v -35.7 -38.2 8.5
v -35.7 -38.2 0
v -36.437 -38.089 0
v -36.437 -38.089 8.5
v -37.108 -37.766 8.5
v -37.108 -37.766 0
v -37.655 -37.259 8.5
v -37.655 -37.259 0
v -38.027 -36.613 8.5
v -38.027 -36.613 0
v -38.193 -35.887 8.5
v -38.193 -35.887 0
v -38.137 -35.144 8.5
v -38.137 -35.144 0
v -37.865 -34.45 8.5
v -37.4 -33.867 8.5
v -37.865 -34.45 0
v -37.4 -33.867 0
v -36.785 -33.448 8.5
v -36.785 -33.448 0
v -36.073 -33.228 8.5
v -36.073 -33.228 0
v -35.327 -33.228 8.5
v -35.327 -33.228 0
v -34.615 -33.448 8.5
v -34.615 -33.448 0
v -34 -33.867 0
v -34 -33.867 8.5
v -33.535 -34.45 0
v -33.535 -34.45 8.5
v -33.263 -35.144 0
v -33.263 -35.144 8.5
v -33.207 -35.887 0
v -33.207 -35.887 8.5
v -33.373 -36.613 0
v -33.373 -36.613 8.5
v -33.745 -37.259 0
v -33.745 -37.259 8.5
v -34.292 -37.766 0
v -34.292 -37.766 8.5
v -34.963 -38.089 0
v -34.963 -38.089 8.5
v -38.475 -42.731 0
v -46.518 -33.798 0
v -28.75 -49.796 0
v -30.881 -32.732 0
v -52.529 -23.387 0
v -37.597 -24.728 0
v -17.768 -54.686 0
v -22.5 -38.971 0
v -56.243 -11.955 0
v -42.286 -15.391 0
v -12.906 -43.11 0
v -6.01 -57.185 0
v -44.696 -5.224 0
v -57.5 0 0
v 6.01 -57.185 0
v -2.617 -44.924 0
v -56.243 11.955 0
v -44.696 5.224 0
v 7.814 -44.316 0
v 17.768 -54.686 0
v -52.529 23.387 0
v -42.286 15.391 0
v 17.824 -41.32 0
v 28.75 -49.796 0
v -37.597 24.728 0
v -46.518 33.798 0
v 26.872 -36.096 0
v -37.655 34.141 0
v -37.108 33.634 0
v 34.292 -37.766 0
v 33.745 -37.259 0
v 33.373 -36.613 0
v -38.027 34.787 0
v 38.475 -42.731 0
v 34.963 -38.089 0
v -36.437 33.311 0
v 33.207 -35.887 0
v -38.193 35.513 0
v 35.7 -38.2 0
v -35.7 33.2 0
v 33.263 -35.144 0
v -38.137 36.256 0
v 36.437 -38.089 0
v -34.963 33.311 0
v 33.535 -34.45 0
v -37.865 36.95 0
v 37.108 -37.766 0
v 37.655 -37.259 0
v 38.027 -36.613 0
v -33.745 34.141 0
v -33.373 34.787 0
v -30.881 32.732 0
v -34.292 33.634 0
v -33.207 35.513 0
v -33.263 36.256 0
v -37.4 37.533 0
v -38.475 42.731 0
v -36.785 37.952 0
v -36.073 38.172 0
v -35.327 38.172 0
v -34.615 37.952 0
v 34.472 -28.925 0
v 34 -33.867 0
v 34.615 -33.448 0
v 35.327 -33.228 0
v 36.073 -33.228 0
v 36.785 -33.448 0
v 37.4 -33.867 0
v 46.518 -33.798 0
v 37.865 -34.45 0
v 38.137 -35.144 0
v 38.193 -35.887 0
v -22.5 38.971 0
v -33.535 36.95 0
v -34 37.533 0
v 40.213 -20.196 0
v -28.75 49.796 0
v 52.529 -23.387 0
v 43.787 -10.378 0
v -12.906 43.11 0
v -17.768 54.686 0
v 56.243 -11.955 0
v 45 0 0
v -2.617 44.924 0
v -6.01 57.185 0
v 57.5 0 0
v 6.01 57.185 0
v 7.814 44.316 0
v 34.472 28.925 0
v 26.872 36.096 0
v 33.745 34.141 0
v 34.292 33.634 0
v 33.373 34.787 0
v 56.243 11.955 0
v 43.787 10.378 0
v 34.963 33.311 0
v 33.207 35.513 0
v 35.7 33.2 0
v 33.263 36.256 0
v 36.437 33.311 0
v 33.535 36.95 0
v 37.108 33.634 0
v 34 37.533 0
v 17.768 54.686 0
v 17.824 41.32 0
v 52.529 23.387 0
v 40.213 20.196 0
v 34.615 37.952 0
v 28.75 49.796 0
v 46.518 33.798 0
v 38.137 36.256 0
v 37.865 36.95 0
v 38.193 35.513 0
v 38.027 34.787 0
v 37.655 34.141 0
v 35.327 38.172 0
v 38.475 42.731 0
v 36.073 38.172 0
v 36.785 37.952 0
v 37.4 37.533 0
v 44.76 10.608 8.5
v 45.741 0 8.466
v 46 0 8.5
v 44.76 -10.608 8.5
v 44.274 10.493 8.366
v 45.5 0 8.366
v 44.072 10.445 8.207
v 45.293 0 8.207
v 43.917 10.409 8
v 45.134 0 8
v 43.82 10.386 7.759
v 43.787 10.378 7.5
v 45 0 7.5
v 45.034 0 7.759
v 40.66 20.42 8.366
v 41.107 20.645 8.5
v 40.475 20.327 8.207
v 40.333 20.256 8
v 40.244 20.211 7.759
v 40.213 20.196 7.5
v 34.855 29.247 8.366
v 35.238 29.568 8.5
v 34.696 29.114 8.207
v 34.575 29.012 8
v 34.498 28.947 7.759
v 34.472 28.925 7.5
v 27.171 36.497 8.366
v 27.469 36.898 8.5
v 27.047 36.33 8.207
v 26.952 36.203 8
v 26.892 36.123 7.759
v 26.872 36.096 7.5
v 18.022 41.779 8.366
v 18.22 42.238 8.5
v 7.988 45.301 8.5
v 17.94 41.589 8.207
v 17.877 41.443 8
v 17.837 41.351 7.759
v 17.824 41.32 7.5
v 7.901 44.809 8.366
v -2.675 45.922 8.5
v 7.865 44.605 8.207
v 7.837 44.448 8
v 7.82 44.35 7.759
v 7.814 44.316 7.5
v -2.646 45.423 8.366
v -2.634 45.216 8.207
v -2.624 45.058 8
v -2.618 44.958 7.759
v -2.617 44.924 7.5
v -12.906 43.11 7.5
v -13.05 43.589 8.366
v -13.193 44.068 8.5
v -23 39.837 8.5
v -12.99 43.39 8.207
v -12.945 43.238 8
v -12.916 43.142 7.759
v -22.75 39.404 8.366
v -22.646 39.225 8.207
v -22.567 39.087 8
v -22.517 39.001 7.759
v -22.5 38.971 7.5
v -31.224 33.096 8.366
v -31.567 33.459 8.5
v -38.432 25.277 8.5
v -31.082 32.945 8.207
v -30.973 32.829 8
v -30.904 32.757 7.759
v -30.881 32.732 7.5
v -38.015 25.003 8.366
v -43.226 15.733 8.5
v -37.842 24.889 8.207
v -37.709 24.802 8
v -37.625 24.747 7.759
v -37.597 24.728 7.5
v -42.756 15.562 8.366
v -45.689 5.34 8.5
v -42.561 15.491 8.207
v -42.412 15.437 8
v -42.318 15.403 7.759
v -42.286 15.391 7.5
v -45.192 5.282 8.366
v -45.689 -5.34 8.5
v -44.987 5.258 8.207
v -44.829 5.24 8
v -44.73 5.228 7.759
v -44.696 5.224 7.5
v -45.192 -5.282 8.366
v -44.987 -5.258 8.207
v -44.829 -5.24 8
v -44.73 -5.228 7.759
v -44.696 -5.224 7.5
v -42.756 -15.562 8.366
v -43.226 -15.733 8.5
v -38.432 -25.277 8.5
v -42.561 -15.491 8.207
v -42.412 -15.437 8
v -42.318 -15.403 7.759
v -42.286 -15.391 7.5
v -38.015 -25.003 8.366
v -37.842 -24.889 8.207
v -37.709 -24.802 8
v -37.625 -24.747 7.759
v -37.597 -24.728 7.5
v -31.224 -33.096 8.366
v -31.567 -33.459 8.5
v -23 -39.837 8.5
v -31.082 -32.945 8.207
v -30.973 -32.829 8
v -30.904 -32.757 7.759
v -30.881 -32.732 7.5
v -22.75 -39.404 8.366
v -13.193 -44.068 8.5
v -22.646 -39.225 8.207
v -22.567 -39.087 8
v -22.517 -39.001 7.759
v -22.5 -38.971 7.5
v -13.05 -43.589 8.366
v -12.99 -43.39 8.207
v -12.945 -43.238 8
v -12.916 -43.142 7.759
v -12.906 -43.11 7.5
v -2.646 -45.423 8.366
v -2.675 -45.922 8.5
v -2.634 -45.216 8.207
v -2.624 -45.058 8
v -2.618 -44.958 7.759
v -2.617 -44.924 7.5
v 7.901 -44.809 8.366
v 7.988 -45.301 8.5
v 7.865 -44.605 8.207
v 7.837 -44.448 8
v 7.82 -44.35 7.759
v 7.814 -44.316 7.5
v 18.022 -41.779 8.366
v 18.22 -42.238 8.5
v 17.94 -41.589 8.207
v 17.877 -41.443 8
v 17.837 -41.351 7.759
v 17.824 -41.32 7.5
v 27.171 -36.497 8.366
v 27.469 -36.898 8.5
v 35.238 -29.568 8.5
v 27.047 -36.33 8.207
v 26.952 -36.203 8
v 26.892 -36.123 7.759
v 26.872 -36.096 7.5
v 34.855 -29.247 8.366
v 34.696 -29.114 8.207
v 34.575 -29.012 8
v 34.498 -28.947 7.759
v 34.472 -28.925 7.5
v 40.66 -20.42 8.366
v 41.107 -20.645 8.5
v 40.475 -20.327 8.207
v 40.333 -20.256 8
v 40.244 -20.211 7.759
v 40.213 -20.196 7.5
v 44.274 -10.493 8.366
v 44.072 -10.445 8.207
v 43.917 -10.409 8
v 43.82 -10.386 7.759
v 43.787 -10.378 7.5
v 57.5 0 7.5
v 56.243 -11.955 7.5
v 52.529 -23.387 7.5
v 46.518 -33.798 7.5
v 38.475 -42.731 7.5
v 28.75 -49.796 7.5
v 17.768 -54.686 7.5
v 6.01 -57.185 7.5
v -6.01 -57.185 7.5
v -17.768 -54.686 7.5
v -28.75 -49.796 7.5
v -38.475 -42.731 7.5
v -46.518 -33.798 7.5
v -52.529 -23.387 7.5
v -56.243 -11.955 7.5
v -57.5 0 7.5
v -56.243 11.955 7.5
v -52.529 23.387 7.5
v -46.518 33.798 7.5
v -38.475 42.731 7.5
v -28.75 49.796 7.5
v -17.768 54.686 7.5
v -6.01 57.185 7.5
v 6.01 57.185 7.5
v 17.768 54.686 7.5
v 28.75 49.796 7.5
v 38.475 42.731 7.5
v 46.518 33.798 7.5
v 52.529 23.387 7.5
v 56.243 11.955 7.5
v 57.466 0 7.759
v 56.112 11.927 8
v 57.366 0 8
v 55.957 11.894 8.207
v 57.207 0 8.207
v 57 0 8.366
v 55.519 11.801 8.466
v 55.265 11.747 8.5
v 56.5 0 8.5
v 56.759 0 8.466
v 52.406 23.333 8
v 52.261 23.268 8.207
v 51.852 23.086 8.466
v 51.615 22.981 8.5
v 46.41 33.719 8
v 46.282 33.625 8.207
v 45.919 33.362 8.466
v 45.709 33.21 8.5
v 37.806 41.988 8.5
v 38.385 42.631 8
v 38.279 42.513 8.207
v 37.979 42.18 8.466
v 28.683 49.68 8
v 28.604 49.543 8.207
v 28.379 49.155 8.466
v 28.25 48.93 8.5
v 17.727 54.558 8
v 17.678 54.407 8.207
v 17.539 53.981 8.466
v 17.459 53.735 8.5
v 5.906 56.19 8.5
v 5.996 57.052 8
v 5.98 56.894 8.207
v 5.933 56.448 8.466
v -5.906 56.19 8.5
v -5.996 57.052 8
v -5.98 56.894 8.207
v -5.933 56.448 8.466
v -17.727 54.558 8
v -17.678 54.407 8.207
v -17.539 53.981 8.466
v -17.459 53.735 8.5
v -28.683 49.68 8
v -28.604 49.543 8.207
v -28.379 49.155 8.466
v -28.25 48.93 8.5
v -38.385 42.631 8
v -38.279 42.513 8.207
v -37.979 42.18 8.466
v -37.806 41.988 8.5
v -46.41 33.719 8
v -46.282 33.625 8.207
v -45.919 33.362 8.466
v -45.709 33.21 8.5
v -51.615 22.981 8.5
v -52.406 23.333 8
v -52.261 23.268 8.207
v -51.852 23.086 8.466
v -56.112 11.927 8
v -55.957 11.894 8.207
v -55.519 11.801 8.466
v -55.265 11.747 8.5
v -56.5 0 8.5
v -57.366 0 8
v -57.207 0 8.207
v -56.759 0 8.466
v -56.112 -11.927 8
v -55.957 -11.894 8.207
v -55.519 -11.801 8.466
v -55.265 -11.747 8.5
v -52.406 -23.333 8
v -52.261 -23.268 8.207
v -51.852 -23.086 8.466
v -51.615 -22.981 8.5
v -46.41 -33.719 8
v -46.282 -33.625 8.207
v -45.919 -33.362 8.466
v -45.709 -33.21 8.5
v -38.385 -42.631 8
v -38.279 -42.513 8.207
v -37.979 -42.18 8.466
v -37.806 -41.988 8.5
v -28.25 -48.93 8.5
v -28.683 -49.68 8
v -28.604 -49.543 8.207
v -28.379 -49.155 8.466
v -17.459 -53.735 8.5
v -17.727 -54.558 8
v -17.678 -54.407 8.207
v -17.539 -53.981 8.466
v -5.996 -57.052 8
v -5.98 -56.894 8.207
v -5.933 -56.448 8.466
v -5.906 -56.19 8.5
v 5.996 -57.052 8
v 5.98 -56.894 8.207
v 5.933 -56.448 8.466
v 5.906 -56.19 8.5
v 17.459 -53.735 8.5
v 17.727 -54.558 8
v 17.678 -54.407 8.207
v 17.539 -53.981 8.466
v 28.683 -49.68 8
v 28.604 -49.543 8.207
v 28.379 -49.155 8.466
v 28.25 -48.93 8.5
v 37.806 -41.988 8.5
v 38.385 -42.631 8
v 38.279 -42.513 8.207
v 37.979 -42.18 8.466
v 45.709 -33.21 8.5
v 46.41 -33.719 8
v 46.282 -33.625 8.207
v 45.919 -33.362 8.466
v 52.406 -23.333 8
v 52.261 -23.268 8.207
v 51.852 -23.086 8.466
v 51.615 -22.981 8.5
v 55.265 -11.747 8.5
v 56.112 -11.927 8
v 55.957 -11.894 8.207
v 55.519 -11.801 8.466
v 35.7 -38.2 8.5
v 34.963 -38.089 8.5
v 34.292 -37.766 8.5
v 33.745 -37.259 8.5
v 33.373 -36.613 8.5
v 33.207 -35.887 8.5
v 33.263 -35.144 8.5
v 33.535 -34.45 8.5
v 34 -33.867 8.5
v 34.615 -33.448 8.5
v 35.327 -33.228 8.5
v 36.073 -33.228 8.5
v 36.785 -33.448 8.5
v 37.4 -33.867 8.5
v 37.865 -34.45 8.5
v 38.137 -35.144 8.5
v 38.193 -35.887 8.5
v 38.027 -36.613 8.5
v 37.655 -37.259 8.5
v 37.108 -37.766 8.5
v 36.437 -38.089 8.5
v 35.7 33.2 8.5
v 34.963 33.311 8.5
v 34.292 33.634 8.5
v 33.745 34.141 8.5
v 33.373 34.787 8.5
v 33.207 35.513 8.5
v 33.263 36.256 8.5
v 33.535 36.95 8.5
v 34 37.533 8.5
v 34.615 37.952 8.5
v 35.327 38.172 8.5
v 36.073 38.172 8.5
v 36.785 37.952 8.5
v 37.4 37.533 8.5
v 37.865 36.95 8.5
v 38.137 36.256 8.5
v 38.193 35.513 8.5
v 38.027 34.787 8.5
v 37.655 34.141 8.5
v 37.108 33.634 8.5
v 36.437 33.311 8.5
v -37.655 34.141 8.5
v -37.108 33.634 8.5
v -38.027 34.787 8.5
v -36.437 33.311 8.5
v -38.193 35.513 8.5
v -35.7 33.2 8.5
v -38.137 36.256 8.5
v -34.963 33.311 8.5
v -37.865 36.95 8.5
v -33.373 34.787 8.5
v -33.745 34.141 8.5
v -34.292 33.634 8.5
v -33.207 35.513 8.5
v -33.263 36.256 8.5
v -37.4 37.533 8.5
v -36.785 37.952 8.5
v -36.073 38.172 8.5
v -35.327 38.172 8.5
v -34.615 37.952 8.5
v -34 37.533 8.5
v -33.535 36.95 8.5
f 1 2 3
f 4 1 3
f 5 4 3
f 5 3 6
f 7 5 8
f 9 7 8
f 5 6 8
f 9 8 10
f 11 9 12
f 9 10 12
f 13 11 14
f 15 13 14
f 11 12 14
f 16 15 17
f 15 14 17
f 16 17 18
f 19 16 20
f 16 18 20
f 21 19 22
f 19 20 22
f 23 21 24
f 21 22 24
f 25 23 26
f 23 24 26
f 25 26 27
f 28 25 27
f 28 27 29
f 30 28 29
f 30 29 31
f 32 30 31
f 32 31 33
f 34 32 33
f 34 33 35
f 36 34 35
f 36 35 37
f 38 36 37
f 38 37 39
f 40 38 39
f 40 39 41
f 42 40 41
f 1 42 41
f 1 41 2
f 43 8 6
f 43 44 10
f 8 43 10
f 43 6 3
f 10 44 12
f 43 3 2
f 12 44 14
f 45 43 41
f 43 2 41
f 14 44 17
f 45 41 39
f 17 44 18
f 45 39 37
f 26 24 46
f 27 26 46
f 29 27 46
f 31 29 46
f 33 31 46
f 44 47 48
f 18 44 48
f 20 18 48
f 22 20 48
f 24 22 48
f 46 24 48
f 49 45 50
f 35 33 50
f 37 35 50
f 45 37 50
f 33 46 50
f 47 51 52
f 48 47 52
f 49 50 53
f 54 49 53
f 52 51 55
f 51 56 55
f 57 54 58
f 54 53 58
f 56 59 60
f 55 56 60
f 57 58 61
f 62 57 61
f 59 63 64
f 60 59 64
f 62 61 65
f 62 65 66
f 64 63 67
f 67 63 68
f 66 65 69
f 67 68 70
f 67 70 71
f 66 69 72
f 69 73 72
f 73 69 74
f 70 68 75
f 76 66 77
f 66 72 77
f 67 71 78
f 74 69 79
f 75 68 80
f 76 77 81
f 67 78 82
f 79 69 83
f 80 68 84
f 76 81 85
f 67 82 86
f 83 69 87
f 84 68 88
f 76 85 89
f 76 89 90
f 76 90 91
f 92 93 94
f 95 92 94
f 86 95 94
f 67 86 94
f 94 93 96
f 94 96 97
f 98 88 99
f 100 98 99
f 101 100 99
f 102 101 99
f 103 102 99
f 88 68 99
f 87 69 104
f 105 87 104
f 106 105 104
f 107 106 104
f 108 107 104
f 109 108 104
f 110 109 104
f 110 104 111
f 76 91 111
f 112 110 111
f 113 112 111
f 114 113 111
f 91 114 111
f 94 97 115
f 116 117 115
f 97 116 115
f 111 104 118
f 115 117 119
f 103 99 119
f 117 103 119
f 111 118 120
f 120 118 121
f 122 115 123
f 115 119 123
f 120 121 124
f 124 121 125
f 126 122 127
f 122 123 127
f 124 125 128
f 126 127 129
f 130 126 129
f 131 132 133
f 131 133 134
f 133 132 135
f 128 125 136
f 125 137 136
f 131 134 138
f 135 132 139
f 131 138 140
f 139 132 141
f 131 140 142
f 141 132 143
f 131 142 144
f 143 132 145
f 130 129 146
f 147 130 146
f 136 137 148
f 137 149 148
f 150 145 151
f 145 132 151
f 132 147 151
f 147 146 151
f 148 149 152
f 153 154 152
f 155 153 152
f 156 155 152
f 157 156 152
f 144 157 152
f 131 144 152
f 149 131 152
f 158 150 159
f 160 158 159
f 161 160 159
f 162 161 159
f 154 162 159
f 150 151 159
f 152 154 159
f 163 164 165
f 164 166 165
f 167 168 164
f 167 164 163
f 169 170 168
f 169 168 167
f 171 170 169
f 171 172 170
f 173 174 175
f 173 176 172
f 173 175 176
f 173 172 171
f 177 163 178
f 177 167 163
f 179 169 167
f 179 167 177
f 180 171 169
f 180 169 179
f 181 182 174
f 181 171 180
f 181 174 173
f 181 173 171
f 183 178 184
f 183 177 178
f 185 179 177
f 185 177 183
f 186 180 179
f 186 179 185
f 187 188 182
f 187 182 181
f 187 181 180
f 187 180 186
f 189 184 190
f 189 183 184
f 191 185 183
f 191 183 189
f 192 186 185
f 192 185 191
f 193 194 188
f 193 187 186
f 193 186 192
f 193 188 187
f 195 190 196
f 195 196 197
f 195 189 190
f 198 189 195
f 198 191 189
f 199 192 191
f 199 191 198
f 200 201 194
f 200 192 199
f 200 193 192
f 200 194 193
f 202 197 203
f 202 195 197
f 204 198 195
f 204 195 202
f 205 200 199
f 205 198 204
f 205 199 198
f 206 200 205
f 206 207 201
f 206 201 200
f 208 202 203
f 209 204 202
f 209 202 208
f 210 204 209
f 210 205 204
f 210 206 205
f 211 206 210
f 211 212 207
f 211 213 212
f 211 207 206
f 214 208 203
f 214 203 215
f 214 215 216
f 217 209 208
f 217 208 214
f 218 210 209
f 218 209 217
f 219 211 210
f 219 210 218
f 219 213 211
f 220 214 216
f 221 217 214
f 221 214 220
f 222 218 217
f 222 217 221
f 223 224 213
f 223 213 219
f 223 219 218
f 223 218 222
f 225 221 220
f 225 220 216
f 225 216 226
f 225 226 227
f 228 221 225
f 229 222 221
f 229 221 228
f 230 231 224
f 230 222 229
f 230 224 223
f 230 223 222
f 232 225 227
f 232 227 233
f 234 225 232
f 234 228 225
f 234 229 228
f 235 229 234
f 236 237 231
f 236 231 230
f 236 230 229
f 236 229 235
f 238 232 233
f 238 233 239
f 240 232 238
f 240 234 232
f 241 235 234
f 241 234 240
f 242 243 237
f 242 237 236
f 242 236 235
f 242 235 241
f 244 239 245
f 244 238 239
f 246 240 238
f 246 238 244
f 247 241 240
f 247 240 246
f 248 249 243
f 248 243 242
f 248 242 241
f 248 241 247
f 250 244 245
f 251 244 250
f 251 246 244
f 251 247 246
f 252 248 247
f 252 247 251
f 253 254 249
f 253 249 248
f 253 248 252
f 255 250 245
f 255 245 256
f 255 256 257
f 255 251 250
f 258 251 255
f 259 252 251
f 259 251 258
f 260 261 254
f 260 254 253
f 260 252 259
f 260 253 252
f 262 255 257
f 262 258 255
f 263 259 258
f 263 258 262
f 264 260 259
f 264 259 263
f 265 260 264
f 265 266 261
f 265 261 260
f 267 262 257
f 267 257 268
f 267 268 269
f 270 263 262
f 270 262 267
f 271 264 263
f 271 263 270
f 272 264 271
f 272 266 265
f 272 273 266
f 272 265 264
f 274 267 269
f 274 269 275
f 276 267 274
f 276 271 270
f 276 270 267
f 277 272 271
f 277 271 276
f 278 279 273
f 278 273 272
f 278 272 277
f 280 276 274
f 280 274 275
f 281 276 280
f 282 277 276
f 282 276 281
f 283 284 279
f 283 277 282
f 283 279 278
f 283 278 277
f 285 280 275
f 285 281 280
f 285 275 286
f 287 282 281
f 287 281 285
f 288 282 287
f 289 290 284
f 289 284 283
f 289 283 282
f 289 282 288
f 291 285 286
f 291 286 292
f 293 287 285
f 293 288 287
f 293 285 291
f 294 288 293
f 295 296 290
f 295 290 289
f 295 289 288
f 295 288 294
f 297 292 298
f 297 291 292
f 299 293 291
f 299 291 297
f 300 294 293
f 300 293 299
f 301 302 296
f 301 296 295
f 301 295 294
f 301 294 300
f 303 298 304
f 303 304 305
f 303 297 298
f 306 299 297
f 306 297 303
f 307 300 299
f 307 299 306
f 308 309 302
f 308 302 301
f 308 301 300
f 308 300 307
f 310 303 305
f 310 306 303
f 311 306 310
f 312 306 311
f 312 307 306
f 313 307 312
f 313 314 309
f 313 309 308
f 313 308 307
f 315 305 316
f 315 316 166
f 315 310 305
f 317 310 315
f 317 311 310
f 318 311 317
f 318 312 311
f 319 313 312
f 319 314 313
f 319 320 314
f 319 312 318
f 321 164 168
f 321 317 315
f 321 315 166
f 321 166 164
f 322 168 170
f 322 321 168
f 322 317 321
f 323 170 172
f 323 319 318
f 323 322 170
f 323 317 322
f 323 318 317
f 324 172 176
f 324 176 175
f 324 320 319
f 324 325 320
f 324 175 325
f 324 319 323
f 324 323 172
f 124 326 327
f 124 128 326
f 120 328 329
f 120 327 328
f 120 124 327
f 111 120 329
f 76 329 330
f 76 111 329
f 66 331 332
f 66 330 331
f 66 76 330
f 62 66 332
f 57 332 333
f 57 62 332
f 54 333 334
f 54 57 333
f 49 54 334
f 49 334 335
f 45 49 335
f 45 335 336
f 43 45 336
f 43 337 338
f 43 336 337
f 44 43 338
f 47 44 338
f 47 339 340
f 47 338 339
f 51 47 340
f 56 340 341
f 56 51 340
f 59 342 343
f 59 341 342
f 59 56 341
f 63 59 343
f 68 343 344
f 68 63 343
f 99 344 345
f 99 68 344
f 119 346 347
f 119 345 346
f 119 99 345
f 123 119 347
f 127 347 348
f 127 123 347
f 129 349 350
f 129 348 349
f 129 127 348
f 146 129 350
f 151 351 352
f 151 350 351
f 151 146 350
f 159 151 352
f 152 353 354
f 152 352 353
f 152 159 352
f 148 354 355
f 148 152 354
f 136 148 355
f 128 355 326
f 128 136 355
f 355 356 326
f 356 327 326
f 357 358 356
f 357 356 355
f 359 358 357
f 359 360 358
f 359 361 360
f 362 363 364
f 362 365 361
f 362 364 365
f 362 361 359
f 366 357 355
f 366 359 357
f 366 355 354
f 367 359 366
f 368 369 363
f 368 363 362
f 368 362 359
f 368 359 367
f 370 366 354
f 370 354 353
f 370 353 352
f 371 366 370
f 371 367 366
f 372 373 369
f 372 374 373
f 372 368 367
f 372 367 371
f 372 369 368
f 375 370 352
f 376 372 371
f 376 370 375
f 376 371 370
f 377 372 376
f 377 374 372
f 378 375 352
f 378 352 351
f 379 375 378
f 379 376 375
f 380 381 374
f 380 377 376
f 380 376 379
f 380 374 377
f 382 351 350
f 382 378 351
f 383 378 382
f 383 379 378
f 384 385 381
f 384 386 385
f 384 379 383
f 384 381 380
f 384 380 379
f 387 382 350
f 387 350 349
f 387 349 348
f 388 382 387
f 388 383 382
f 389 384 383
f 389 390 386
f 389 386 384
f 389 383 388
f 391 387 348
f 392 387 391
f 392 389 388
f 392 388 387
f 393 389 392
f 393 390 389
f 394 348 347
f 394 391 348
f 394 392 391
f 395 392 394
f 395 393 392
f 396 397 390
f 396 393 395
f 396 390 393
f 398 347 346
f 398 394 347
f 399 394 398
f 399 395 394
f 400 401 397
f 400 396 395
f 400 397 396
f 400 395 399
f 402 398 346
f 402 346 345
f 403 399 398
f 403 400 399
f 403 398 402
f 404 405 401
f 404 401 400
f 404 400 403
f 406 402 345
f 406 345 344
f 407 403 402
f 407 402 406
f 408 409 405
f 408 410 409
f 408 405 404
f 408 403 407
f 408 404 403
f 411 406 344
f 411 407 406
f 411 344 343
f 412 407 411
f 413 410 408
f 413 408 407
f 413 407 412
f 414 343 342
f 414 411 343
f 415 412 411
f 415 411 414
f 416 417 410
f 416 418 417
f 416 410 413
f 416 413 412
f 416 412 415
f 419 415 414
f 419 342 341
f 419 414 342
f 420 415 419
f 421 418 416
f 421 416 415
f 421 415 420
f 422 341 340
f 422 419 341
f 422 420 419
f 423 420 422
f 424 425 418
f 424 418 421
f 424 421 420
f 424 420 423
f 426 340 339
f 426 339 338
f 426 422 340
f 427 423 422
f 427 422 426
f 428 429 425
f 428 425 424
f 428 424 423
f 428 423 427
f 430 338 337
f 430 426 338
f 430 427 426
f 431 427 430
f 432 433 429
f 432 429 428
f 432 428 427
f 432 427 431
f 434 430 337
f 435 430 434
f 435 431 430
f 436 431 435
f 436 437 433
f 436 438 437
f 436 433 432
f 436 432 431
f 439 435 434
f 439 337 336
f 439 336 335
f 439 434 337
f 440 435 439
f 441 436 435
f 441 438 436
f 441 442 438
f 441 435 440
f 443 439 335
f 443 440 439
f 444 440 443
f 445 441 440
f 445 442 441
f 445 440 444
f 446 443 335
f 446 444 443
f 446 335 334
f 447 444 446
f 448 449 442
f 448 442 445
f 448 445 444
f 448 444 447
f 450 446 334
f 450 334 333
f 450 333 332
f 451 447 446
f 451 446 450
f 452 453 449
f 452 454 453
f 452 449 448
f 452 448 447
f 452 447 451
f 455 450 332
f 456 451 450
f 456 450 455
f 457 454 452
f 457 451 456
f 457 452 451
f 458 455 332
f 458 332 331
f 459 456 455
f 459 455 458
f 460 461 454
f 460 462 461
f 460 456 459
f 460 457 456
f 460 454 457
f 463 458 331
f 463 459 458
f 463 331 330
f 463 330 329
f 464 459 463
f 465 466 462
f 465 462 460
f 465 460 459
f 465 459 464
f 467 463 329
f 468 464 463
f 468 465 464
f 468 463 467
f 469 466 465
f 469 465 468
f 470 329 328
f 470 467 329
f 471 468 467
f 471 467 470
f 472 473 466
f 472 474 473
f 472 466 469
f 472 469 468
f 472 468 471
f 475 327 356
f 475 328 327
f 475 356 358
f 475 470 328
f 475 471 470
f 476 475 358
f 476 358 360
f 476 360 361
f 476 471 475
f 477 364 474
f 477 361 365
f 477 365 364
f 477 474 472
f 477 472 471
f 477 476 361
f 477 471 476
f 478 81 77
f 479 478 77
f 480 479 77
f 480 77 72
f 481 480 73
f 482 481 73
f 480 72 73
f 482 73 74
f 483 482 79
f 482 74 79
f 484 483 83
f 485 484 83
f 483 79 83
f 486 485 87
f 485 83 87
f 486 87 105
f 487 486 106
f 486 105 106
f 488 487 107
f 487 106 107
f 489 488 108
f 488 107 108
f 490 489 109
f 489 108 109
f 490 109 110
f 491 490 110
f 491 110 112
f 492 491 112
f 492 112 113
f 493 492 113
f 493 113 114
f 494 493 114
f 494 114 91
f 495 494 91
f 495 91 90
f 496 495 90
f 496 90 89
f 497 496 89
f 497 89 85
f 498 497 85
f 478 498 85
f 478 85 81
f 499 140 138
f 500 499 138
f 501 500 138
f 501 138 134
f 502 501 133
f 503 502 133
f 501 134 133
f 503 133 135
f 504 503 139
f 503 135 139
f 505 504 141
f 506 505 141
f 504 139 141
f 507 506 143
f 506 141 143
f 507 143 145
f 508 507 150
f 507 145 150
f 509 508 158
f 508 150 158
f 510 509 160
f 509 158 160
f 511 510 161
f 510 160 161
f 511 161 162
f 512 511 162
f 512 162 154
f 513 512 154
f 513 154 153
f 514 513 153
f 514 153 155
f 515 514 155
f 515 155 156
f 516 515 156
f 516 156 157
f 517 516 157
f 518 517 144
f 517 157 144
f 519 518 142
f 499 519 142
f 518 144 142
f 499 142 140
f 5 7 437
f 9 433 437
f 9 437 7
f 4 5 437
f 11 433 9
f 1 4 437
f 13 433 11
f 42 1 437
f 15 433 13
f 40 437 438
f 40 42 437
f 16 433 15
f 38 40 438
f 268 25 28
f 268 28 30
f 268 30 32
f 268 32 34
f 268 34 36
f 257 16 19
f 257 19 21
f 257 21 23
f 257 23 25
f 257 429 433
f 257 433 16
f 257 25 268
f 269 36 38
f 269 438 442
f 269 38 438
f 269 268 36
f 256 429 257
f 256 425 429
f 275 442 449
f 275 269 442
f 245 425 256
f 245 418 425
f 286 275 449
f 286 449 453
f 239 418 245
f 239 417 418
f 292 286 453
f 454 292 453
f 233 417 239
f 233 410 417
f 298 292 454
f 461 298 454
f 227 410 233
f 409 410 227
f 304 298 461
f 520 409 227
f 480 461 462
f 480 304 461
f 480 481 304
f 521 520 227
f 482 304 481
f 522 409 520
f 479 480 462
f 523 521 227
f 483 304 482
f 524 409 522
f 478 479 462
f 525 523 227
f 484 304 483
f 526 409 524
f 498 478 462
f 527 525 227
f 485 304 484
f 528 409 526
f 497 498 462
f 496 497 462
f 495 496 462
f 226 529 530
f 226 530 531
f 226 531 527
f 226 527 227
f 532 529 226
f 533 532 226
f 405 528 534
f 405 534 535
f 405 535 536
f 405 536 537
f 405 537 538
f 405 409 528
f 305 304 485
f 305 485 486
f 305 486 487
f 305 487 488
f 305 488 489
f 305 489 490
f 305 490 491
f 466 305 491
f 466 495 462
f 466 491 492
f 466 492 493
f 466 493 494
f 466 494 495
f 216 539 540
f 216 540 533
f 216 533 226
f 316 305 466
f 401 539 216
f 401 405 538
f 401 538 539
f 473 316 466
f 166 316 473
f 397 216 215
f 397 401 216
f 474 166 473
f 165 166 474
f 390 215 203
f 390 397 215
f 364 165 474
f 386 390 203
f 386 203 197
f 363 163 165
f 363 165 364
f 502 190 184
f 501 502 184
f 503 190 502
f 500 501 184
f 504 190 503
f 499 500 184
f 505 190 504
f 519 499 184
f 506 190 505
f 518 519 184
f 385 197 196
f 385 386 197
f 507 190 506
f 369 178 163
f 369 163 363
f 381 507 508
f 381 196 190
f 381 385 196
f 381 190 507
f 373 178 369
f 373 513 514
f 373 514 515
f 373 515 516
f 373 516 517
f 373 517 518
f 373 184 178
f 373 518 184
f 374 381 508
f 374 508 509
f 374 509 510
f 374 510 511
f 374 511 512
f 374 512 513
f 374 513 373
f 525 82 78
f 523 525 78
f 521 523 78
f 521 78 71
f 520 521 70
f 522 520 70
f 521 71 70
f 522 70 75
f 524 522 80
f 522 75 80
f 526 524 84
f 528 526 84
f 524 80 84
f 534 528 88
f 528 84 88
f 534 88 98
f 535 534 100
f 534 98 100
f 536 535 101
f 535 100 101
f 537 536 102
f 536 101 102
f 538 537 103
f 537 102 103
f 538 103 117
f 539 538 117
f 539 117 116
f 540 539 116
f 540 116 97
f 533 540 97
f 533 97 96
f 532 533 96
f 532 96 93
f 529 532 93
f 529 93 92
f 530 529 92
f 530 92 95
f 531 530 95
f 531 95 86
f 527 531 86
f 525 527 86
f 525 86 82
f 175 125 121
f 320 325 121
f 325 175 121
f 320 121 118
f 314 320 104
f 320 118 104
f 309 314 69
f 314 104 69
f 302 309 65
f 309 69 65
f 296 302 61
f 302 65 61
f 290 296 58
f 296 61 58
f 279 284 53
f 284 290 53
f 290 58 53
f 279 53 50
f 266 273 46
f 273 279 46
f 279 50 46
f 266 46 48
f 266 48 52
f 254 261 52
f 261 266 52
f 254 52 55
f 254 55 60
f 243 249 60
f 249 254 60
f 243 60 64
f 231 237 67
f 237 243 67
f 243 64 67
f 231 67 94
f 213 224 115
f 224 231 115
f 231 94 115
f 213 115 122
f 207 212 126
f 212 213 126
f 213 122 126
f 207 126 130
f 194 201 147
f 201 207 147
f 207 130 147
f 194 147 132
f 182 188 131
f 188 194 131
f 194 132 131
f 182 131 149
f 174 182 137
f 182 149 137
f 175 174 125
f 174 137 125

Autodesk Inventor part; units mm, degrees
ref_plane "YZ Plane" through (0, 0, 0) normal (1, 0, 0) x (0, 1, 0)
ref_plane "XZ Plane" through (0, 0, 0) normal (0, 1, 0) x (-1, 0, 0)
ref_plane "XY Plane" through (0, 0, 0) normal (0, 0, 1) x (1, 0, 0)
sketch "スケッチ1" plane through (0, 0, 0) normal (0, 0, 1) x (1, 0, 0)
  circle A0 centre (0, 0) radius 45
  circle A1 centre (0, 0) radius 57.5
  dimension "d0" = 90
  dimension "d1" = 115
extrude "押し出し1" add sketch "スケッチ1" along normal blind 8.5
sketch "スケッチ2" plane through (0, 0, 8.5) normal (0, 0, 1) x (1, 0, 0)
  line L0 (0, 0) -> (35.7, 0)
  line L1 (35.7, 0) -> (35.7, -35.7)
  line L2 (35.7, -35.7) -> (0, -35.7)
  line L3 (0, -35.7) -> (0, 0)
  point P0 (35.7, 35.7)
  point P1 (-35.7, 35.7)
  point P2 (-35.7, -35.7)
  dimension "d13" = 35.7
  dimension "d14" = 35.7
  dimension "d17" = 360
hole "穴1" at (-35.7, 35.7, 8.5) at (35.7, 35.7, 8.5) at (-35.7, -35.7, 8.5) at (35.7, -35.7, 8.5) direction (0, 0, -1) diameter 5 end through all
fillet "フィレット1" radius 1 2 edges at (-45, 0, 8.5) (-57.5, 0, 8.5)
properties part number "turntable_in_8_23" material "アルミニウム 6061-AHC"
